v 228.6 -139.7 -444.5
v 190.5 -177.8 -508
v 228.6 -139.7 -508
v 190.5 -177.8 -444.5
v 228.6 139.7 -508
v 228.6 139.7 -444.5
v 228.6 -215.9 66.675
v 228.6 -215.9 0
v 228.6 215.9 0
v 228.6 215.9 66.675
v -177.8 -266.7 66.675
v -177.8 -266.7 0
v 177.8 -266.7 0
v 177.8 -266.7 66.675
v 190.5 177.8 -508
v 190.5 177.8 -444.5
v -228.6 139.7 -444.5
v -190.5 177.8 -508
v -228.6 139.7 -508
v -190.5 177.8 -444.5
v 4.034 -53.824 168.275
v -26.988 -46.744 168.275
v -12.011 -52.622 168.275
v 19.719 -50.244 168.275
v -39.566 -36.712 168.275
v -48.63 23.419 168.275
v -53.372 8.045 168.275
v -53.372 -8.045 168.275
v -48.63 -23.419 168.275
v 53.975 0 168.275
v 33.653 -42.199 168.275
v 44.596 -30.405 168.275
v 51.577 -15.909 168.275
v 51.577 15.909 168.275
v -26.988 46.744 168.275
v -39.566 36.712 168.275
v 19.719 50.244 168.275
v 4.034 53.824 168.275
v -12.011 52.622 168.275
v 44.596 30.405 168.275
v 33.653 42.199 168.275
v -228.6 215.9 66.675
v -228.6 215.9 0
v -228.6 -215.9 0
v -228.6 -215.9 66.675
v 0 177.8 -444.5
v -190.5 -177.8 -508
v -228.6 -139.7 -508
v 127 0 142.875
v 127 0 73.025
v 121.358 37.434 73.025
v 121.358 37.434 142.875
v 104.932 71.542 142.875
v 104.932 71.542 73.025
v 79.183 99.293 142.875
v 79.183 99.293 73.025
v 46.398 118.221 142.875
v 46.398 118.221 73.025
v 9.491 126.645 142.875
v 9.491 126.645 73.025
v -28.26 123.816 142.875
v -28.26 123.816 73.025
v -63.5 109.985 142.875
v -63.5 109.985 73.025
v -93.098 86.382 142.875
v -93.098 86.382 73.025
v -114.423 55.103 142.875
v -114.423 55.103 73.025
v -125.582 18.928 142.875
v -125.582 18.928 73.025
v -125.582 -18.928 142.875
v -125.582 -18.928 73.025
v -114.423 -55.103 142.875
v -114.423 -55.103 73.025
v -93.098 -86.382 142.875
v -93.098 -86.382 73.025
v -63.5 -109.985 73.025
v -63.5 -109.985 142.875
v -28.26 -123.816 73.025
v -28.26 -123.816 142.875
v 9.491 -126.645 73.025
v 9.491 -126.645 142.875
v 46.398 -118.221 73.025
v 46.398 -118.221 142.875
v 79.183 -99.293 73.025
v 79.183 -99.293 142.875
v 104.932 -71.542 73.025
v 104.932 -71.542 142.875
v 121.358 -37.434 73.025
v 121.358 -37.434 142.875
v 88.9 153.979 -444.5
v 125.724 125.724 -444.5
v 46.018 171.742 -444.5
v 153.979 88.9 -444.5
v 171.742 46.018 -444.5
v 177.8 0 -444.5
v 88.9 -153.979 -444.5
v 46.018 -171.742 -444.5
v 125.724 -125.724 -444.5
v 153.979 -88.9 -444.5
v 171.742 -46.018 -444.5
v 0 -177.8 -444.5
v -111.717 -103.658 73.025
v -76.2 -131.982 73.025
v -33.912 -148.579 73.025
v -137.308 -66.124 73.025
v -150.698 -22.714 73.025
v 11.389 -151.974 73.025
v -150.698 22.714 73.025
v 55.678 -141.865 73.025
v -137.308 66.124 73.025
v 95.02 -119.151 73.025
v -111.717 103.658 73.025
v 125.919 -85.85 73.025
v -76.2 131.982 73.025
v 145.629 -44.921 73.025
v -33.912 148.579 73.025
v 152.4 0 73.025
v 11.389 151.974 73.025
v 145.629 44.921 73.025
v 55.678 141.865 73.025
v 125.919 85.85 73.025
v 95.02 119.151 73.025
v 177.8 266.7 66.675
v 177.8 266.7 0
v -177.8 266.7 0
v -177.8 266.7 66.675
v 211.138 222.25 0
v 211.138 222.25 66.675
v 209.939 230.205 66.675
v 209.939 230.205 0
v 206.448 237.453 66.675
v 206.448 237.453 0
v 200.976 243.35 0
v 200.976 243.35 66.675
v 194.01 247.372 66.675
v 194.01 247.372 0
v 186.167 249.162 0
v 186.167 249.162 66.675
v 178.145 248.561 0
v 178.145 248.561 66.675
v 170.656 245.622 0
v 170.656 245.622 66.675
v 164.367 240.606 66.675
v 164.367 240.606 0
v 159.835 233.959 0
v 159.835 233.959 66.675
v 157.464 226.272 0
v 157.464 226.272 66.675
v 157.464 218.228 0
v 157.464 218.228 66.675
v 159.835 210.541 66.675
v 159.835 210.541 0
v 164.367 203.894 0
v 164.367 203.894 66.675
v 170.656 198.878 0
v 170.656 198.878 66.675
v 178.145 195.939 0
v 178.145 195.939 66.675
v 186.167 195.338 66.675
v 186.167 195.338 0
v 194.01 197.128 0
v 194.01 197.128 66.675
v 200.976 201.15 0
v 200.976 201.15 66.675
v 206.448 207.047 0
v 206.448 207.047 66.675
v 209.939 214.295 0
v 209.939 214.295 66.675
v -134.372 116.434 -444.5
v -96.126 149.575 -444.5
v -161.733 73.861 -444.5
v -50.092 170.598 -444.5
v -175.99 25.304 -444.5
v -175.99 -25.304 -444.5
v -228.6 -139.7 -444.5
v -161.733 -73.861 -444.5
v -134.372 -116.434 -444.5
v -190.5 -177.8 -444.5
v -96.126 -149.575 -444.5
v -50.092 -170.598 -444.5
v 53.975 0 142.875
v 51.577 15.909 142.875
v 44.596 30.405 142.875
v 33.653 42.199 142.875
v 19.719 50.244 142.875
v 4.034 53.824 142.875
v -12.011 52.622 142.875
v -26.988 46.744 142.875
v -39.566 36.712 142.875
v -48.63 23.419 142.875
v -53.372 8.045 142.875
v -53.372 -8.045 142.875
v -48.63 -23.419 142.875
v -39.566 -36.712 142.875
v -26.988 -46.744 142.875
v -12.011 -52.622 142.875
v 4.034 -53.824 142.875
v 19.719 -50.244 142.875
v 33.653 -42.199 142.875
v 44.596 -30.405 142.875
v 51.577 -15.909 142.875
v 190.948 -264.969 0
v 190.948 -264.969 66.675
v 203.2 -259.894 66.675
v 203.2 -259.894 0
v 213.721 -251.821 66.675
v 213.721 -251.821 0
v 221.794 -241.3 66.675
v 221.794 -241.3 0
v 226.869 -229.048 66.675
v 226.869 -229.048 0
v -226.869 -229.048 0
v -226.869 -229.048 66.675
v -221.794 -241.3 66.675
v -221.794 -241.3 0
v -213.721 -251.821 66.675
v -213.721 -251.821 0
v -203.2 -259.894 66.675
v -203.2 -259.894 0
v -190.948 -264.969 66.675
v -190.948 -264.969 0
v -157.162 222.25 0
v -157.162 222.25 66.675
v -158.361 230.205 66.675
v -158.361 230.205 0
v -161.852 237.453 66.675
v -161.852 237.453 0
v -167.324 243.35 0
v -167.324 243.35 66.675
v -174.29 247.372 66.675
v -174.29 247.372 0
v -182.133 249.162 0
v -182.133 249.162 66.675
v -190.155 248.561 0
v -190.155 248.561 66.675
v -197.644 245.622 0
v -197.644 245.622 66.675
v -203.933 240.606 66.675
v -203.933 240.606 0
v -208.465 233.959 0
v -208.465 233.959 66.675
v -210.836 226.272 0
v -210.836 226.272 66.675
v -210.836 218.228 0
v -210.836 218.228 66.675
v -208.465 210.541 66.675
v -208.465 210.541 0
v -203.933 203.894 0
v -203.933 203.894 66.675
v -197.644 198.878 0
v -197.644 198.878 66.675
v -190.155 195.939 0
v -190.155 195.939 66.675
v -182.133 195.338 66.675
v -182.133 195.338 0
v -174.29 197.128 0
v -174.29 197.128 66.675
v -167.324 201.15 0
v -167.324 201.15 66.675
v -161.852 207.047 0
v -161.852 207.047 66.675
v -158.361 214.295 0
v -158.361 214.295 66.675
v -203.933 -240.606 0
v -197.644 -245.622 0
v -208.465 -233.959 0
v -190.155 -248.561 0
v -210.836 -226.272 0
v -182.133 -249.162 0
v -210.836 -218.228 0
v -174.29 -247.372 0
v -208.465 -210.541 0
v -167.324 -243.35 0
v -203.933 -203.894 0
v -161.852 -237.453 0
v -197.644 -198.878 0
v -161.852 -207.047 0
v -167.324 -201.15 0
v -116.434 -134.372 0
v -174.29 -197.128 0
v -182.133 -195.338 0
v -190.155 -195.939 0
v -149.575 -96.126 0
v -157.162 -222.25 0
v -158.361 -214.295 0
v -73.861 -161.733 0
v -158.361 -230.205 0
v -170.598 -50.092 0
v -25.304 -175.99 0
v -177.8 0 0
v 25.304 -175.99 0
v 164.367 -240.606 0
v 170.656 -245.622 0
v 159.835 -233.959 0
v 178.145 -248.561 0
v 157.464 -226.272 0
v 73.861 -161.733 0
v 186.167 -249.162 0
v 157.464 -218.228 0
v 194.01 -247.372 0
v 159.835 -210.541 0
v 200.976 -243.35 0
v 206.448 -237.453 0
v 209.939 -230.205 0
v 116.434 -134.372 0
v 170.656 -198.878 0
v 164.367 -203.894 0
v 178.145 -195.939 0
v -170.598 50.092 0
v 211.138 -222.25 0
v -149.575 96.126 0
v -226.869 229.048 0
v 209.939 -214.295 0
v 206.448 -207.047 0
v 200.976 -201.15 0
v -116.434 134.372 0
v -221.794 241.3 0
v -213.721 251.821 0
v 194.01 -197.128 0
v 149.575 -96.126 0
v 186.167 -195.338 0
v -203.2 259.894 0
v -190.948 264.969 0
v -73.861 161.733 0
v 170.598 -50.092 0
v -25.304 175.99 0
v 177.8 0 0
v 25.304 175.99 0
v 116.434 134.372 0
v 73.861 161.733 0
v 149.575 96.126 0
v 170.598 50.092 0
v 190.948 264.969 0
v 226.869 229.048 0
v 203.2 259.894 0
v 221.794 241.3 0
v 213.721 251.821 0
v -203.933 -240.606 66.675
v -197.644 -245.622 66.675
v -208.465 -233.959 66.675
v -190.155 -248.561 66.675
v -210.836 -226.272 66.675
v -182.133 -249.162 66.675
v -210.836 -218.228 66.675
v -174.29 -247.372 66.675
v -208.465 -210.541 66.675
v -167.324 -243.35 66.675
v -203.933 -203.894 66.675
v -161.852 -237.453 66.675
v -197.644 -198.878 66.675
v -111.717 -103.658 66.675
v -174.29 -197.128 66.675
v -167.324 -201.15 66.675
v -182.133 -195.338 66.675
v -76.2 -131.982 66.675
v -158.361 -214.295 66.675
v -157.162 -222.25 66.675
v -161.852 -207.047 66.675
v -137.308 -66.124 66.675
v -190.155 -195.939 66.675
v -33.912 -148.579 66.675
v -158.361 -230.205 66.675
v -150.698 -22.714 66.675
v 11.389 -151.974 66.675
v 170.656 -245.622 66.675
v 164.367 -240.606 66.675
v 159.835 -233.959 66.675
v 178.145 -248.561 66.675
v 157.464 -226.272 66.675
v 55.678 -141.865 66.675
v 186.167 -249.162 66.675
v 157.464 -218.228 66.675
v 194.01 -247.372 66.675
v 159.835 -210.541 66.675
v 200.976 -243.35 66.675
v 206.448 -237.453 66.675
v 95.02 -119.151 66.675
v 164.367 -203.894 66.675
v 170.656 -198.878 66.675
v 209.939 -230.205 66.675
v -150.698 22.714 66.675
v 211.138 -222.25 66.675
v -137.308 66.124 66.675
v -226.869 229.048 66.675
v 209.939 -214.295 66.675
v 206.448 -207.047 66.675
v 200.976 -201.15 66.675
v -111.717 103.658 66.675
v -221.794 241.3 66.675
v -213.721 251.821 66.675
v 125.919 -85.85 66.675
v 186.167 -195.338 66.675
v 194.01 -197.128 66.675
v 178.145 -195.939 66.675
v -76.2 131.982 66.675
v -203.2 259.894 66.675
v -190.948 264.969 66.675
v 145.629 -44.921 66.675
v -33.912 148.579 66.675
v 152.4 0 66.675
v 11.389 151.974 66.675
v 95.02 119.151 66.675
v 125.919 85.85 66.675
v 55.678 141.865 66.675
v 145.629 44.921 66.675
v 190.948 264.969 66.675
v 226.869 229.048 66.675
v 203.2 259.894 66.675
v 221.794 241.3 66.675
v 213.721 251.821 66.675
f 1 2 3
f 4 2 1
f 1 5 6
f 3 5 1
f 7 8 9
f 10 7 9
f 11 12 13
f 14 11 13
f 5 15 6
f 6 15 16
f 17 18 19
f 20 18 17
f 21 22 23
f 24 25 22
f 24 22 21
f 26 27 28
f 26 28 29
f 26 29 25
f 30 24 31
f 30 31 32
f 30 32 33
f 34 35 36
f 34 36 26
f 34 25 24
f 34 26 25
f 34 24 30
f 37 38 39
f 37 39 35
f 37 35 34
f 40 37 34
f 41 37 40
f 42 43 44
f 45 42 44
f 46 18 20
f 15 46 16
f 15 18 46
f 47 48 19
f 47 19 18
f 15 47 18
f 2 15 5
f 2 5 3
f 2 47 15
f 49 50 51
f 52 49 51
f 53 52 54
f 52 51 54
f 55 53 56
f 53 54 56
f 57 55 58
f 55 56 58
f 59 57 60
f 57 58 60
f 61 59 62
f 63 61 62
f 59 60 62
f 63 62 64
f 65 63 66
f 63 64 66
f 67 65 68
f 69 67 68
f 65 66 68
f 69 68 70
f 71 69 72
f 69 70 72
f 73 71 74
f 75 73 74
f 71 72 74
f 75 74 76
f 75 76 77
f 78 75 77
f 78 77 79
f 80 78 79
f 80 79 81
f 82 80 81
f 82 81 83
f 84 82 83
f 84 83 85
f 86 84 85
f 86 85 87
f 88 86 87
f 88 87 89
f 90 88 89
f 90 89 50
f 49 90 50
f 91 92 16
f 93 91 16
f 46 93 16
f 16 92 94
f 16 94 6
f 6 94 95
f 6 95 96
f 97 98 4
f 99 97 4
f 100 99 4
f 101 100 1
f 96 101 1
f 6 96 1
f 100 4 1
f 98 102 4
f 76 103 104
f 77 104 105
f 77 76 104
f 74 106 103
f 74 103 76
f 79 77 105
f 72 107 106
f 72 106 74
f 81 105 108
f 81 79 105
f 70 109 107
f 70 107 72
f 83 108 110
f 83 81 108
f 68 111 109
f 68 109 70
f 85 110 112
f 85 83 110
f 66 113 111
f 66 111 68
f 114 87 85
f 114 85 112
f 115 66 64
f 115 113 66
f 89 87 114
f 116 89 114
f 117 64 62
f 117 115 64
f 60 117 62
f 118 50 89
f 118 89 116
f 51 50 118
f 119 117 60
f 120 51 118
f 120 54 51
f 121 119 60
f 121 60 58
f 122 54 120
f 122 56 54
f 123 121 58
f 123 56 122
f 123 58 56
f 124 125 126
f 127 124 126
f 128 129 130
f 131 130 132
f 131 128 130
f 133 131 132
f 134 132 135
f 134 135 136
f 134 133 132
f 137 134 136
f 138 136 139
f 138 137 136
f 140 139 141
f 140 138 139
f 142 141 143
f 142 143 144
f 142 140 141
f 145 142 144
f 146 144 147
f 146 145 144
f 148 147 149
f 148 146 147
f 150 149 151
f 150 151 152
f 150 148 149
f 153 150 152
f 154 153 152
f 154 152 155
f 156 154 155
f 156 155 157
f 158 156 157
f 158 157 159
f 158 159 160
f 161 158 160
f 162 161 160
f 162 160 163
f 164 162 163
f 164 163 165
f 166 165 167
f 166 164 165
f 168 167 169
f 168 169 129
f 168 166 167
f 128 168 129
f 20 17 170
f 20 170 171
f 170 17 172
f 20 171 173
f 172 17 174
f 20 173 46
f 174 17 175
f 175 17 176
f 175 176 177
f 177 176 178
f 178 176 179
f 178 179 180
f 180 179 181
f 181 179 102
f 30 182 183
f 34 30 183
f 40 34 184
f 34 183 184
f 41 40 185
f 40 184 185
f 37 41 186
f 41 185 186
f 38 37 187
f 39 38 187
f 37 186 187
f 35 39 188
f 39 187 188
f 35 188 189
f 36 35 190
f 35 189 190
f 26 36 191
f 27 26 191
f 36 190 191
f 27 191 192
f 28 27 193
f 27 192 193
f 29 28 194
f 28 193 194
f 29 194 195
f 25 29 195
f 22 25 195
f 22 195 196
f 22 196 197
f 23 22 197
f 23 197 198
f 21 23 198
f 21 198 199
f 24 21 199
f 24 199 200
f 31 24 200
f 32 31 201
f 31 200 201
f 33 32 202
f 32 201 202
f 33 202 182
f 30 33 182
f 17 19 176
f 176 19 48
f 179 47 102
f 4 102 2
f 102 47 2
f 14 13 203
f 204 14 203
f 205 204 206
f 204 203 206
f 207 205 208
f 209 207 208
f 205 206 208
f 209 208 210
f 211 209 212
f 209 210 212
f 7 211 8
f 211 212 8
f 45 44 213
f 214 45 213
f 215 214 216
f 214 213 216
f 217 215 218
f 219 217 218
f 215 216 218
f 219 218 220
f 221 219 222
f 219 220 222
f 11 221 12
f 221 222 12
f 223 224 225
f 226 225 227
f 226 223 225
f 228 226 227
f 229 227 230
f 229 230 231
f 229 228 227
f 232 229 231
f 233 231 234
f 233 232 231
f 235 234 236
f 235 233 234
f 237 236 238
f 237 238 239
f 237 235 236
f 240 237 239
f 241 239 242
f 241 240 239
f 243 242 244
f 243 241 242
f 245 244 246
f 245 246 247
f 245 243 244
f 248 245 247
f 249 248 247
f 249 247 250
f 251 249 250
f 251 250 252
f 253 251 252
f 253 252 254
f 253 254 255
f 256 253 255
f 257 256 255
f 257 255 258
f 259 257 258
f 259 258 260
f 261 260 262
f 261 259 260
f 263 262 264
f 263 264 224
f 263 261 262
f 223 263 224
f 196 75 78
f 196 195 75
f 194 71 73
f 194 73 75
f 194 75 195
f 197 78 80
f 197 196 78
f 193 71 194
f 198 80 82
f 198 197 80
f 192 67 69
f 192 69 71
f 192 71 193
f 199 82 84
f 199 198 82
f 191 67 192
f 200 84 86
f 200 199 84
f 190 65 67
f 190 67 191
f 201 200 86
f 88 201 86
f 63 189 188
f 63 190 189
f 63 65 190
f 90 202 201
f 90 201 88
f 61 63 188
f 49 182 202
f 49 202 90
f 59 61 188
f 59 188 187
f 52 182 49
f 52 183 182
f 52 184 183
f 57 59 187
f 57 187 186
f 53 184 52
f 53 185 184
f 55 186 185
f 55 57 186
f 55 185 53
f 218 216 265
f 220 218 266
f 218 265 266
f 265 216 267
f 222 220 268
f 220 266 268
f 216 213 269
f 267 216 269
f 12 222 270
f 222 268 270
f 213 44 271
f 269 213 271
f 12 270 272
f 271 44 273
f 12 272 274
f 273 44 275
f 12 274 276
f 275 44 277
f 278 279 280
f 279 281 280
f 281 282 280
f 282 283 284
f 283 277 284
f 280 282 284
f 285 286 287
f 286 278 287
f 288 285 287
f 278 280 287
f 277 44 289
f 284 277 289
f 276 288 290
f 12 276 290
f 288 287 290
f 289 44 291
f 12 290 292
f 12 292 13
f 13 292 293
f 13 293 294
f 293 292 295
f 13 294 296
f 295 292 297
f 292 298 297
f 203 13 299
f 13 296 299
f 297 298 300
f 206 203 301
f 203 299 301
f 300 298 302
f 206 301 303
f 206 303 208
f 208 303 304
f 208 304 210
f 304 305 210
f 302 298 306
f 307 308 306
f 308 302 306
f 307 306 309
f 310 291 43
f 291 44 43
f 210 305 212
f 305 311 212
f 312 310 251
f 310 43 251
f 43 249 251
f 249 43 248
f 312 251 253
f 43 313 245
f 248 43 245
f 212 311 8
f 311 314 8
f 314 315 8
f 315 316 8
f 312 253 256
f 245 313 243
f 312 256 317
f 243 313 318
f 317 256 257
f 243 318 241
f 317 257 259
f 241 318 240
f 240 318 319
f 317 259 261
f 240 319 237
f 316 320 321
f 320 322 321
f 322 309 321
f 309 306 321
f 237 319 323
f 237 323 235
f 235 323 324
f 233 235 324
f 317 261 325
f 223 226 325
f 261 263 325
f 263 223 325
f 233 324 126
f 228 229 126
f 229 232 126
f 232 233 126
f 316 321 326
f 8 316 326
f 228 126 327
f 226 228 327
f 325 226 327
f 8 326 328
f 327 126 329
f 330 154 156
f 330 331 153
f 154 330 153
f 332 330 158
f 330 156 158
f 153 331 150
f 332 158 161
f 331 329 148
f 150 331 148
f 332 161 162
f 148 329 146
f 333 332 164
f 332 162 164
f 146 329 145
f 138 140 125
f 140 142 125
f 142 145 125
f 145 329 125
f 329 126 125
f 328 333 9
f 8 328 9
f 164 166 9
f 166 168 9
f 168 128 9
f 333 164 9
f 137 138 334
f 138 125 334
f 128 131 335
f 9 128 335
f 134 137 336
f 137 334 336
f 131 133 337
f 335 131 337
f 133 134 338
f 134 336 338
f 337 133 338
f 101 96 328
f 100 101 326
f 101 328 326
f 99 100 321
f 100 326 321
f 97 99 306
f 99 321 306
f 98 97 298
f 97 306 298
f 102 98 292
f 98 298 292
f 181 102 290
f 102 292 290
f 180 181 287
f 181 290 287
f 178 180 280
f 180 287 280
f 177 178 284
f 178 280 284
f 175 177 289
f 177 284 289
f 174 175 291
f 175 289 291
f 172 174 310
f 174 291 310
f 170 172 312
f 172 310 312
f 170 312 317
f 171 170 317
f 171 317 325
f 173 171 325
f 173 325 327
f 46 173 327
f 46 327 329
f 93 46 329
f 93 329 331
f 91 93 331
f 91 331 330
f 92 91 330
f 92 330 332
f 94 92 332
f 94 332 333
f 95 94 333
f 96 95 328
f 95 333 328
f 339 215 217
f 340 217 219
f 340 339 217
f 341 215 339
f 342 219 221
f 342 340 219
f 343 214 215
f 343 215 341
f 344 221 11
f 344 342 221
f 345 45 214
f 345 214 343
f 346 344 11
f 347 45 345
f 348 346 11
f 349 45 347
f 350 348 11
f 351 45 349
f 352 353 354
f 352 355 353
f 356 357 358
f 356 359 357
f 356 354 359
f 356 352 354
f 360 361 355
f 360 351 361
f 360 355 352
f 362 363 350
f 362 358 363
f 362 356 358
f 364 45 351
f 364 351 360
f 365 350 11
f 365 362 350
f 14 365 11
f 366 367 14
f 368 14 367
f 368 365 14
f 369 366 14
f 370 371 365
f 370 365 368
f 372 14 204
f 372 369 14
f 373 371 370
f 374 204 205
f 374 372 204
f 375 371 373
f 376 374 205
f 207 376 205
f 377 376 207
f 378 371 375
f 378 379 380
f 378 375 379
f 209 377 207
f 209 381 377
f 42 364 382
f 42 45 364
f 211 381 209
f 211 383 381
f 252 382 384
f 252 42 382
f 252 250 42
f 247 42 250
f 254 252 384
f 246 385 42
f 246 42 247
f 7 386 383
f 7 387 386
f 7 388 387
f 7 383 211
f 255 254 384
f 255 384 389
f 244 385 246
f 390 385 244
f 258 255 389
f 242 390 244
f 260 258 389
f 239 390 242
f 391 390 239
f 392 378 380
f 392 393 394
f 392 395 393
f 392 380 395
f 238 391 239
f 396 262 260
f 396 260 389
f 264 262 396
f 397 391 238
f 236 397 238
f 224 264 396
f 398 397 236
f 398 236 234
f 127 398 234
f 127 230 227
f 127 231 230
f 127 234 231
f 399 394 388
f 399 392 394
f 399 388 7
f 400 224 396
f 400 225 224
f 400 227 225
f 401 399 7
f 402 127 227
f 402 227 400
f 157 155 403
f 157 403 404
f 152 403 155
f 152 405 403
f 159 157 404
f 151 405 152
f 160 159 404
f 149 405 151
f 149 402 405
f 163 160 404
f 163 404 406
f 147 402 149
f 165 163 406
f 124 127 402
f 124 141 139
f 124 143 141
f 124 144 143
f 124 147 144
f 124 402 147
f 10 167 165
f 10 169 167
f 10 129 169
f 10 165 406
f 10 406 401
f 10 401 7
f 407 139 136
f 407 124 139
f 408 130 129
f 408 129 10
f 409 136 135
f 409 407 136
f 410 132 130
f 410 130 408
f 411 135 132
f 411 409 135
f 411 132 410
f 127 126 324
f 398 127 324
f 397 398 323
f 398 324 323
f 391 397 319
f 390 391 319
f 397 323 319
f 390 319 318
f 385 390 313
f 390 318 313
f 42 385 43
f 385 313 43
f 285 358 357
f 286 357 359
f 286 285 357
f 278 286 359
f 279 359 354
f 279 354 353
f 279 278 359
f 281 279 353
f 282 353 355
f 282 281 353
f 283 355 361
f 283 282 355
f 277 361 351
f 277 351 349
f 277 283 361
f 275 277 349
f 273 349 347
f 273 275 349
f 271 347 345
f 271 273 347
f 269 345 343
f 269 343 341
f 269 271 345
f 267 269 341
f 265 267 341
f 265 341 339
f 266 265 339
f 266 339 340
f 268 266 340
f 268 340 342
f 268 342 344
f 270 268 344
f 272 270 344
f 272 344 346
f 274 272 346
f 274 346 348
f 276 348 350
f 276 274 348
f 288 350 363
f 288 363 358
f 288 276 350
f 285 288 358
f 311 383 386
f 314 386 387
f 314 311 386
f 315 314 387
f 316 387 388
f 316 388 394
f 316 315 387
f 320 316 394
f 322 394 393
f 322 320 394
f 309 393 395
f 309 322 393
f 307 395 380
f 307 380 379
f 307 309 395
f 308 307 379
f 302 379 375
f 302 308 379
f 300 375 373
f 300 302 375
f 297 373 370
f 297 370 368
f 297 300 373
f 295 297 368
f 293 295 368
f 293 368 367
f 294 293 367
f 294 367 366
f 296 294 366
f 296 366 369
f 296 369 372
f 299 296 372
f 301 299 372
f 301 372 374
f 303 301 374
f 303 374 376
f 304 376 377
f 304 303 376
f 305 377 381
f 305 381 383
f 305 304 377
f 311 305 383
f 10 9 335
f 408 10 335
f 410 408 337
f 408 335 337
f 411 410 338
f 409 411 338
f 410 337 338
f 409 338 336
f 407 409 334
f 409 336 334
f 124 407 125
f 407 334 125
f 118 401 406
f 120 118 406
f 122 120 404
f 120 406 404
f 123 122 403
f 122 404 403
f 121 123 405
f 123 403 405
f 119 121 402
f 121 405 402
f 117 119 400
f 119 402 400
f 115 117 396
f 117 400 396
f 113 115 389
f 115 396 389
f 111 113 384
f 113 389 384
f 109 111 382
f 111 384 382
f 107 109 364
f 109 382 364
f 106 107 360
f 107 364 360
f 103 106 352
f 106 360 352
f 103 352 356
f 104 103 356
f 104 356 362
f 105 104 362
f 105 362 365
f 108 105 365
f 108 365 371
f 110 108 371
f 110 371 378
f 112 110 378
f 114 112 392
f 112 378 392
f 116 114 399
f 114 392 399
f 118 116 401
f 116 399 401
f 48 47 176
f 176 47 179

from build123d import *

# Parameters (mm, degrees)
F0_R      = 26.9875
F1_DEPTH  = 66.675
F2_R      = 152.4
F3_DEPTH  = 6.35
F4_R      = 127
F5_DEPTH  = 76.2
F6_R      = 53.975
F7_DEPTH  = 25.4
F8_R      = 177.8
F9_DEPTH  = 508
F10_W     = 457.2
F10_H     = 355.6
F11_DEPTH = 63.5
F12_SIZE  = 38.1


with BuildPart() as f1:
    # F0 (on Top) → F1 (new body)
    with BuildSketch(Plane.XY):
        with BuildLine():
            Line((177.8, 266.7), (-177.8, 266.7))
            ThreePointArc((-177.8, 266.7), (-213.721024, 251.821024), (-228.6, 215.9))
            Line((-228.6, 215.9), (-228.6, -215.9))
            ThreePointArc((-228.6, -215.9), (-213.721024, -251.821024), (-177.8, -266.7))
            Line((-177.8, -266.7), (177.8, -266.7))
            ThreePointArc((177.8, -266.7), (213.721024, -251.821024), (228.6, -215.9))
            Line((228.6, -215.9), (228.6, 215.9))
            ThreePointArc((228.6, 215.9), (213.721024, 251.821024), (177.8, 266.7))
        make_face()
        with Locations((-184.15, -222.25)):
            Circle(F0_R, mode=Mode.SUBTRACT)
        with Locations((184.15, -222.25)):
            Circle(F0_R, mode=Mode.SUBTRACT)
        with Locations((-184.15, 222.25)):
            Circle(F0_R, mode=Mode.SUBTRACT)
        with Locations((184.15, 222.25)):
            Circle(F0_R, mode=Mode.SUBTRACT)
    extrude(amount=F1_DEPTH)

    # F2 (on face) → F3 (join)
    with BuildSketch(Plane.XY.offset(66.675)):
        Circle(F2_R)
    extrude(amount=F3_DEPTH)

    # F4 (on face) → F5 (join)
    with BuildSketch(Plane.XY.offset(66.675)):
        Circle(F4_R)
    extrude(amount=F5_DEPTH)

    # F6 (on face) → F7 (join)
    with BuildSketch(Plane.XY.offset(142.875)):
        Circle(F6_R)
    extrude(amount=F7_DEPTH)

    # F8 (on face) → F9 (join)
    with BuildSketch(Plane(origin=(0, 0, 0), x_dir=(1, 0, 0), z_dir=(0, 0, -1))):
        Circle(F8_R)
    extrude(amount=F9_DEPTH)

    # F10 (on face) → F11 (join)
    with BuildSketch(Plane(origin=(0, 0, -508), x_dir=(1, 0, 0), z_dir=(0, 0, -1))):
        Rectangle(F10_W, F10_H)
    extrude(amount=-F11_DEPTH)

    # F12
    f12_edges = [f1.edges().sort_by_distance(p)[0] for p in [
        (228.6, -177.8, -476.25),
        (-228.6, -177.8, -476.25),
        (228.6, 177.8, -476.25),
        (-228.6, 177.8, -476.25),
    ]]
    chamfer(f12_edges, length=F12_SIZE)


solid = f1.part
